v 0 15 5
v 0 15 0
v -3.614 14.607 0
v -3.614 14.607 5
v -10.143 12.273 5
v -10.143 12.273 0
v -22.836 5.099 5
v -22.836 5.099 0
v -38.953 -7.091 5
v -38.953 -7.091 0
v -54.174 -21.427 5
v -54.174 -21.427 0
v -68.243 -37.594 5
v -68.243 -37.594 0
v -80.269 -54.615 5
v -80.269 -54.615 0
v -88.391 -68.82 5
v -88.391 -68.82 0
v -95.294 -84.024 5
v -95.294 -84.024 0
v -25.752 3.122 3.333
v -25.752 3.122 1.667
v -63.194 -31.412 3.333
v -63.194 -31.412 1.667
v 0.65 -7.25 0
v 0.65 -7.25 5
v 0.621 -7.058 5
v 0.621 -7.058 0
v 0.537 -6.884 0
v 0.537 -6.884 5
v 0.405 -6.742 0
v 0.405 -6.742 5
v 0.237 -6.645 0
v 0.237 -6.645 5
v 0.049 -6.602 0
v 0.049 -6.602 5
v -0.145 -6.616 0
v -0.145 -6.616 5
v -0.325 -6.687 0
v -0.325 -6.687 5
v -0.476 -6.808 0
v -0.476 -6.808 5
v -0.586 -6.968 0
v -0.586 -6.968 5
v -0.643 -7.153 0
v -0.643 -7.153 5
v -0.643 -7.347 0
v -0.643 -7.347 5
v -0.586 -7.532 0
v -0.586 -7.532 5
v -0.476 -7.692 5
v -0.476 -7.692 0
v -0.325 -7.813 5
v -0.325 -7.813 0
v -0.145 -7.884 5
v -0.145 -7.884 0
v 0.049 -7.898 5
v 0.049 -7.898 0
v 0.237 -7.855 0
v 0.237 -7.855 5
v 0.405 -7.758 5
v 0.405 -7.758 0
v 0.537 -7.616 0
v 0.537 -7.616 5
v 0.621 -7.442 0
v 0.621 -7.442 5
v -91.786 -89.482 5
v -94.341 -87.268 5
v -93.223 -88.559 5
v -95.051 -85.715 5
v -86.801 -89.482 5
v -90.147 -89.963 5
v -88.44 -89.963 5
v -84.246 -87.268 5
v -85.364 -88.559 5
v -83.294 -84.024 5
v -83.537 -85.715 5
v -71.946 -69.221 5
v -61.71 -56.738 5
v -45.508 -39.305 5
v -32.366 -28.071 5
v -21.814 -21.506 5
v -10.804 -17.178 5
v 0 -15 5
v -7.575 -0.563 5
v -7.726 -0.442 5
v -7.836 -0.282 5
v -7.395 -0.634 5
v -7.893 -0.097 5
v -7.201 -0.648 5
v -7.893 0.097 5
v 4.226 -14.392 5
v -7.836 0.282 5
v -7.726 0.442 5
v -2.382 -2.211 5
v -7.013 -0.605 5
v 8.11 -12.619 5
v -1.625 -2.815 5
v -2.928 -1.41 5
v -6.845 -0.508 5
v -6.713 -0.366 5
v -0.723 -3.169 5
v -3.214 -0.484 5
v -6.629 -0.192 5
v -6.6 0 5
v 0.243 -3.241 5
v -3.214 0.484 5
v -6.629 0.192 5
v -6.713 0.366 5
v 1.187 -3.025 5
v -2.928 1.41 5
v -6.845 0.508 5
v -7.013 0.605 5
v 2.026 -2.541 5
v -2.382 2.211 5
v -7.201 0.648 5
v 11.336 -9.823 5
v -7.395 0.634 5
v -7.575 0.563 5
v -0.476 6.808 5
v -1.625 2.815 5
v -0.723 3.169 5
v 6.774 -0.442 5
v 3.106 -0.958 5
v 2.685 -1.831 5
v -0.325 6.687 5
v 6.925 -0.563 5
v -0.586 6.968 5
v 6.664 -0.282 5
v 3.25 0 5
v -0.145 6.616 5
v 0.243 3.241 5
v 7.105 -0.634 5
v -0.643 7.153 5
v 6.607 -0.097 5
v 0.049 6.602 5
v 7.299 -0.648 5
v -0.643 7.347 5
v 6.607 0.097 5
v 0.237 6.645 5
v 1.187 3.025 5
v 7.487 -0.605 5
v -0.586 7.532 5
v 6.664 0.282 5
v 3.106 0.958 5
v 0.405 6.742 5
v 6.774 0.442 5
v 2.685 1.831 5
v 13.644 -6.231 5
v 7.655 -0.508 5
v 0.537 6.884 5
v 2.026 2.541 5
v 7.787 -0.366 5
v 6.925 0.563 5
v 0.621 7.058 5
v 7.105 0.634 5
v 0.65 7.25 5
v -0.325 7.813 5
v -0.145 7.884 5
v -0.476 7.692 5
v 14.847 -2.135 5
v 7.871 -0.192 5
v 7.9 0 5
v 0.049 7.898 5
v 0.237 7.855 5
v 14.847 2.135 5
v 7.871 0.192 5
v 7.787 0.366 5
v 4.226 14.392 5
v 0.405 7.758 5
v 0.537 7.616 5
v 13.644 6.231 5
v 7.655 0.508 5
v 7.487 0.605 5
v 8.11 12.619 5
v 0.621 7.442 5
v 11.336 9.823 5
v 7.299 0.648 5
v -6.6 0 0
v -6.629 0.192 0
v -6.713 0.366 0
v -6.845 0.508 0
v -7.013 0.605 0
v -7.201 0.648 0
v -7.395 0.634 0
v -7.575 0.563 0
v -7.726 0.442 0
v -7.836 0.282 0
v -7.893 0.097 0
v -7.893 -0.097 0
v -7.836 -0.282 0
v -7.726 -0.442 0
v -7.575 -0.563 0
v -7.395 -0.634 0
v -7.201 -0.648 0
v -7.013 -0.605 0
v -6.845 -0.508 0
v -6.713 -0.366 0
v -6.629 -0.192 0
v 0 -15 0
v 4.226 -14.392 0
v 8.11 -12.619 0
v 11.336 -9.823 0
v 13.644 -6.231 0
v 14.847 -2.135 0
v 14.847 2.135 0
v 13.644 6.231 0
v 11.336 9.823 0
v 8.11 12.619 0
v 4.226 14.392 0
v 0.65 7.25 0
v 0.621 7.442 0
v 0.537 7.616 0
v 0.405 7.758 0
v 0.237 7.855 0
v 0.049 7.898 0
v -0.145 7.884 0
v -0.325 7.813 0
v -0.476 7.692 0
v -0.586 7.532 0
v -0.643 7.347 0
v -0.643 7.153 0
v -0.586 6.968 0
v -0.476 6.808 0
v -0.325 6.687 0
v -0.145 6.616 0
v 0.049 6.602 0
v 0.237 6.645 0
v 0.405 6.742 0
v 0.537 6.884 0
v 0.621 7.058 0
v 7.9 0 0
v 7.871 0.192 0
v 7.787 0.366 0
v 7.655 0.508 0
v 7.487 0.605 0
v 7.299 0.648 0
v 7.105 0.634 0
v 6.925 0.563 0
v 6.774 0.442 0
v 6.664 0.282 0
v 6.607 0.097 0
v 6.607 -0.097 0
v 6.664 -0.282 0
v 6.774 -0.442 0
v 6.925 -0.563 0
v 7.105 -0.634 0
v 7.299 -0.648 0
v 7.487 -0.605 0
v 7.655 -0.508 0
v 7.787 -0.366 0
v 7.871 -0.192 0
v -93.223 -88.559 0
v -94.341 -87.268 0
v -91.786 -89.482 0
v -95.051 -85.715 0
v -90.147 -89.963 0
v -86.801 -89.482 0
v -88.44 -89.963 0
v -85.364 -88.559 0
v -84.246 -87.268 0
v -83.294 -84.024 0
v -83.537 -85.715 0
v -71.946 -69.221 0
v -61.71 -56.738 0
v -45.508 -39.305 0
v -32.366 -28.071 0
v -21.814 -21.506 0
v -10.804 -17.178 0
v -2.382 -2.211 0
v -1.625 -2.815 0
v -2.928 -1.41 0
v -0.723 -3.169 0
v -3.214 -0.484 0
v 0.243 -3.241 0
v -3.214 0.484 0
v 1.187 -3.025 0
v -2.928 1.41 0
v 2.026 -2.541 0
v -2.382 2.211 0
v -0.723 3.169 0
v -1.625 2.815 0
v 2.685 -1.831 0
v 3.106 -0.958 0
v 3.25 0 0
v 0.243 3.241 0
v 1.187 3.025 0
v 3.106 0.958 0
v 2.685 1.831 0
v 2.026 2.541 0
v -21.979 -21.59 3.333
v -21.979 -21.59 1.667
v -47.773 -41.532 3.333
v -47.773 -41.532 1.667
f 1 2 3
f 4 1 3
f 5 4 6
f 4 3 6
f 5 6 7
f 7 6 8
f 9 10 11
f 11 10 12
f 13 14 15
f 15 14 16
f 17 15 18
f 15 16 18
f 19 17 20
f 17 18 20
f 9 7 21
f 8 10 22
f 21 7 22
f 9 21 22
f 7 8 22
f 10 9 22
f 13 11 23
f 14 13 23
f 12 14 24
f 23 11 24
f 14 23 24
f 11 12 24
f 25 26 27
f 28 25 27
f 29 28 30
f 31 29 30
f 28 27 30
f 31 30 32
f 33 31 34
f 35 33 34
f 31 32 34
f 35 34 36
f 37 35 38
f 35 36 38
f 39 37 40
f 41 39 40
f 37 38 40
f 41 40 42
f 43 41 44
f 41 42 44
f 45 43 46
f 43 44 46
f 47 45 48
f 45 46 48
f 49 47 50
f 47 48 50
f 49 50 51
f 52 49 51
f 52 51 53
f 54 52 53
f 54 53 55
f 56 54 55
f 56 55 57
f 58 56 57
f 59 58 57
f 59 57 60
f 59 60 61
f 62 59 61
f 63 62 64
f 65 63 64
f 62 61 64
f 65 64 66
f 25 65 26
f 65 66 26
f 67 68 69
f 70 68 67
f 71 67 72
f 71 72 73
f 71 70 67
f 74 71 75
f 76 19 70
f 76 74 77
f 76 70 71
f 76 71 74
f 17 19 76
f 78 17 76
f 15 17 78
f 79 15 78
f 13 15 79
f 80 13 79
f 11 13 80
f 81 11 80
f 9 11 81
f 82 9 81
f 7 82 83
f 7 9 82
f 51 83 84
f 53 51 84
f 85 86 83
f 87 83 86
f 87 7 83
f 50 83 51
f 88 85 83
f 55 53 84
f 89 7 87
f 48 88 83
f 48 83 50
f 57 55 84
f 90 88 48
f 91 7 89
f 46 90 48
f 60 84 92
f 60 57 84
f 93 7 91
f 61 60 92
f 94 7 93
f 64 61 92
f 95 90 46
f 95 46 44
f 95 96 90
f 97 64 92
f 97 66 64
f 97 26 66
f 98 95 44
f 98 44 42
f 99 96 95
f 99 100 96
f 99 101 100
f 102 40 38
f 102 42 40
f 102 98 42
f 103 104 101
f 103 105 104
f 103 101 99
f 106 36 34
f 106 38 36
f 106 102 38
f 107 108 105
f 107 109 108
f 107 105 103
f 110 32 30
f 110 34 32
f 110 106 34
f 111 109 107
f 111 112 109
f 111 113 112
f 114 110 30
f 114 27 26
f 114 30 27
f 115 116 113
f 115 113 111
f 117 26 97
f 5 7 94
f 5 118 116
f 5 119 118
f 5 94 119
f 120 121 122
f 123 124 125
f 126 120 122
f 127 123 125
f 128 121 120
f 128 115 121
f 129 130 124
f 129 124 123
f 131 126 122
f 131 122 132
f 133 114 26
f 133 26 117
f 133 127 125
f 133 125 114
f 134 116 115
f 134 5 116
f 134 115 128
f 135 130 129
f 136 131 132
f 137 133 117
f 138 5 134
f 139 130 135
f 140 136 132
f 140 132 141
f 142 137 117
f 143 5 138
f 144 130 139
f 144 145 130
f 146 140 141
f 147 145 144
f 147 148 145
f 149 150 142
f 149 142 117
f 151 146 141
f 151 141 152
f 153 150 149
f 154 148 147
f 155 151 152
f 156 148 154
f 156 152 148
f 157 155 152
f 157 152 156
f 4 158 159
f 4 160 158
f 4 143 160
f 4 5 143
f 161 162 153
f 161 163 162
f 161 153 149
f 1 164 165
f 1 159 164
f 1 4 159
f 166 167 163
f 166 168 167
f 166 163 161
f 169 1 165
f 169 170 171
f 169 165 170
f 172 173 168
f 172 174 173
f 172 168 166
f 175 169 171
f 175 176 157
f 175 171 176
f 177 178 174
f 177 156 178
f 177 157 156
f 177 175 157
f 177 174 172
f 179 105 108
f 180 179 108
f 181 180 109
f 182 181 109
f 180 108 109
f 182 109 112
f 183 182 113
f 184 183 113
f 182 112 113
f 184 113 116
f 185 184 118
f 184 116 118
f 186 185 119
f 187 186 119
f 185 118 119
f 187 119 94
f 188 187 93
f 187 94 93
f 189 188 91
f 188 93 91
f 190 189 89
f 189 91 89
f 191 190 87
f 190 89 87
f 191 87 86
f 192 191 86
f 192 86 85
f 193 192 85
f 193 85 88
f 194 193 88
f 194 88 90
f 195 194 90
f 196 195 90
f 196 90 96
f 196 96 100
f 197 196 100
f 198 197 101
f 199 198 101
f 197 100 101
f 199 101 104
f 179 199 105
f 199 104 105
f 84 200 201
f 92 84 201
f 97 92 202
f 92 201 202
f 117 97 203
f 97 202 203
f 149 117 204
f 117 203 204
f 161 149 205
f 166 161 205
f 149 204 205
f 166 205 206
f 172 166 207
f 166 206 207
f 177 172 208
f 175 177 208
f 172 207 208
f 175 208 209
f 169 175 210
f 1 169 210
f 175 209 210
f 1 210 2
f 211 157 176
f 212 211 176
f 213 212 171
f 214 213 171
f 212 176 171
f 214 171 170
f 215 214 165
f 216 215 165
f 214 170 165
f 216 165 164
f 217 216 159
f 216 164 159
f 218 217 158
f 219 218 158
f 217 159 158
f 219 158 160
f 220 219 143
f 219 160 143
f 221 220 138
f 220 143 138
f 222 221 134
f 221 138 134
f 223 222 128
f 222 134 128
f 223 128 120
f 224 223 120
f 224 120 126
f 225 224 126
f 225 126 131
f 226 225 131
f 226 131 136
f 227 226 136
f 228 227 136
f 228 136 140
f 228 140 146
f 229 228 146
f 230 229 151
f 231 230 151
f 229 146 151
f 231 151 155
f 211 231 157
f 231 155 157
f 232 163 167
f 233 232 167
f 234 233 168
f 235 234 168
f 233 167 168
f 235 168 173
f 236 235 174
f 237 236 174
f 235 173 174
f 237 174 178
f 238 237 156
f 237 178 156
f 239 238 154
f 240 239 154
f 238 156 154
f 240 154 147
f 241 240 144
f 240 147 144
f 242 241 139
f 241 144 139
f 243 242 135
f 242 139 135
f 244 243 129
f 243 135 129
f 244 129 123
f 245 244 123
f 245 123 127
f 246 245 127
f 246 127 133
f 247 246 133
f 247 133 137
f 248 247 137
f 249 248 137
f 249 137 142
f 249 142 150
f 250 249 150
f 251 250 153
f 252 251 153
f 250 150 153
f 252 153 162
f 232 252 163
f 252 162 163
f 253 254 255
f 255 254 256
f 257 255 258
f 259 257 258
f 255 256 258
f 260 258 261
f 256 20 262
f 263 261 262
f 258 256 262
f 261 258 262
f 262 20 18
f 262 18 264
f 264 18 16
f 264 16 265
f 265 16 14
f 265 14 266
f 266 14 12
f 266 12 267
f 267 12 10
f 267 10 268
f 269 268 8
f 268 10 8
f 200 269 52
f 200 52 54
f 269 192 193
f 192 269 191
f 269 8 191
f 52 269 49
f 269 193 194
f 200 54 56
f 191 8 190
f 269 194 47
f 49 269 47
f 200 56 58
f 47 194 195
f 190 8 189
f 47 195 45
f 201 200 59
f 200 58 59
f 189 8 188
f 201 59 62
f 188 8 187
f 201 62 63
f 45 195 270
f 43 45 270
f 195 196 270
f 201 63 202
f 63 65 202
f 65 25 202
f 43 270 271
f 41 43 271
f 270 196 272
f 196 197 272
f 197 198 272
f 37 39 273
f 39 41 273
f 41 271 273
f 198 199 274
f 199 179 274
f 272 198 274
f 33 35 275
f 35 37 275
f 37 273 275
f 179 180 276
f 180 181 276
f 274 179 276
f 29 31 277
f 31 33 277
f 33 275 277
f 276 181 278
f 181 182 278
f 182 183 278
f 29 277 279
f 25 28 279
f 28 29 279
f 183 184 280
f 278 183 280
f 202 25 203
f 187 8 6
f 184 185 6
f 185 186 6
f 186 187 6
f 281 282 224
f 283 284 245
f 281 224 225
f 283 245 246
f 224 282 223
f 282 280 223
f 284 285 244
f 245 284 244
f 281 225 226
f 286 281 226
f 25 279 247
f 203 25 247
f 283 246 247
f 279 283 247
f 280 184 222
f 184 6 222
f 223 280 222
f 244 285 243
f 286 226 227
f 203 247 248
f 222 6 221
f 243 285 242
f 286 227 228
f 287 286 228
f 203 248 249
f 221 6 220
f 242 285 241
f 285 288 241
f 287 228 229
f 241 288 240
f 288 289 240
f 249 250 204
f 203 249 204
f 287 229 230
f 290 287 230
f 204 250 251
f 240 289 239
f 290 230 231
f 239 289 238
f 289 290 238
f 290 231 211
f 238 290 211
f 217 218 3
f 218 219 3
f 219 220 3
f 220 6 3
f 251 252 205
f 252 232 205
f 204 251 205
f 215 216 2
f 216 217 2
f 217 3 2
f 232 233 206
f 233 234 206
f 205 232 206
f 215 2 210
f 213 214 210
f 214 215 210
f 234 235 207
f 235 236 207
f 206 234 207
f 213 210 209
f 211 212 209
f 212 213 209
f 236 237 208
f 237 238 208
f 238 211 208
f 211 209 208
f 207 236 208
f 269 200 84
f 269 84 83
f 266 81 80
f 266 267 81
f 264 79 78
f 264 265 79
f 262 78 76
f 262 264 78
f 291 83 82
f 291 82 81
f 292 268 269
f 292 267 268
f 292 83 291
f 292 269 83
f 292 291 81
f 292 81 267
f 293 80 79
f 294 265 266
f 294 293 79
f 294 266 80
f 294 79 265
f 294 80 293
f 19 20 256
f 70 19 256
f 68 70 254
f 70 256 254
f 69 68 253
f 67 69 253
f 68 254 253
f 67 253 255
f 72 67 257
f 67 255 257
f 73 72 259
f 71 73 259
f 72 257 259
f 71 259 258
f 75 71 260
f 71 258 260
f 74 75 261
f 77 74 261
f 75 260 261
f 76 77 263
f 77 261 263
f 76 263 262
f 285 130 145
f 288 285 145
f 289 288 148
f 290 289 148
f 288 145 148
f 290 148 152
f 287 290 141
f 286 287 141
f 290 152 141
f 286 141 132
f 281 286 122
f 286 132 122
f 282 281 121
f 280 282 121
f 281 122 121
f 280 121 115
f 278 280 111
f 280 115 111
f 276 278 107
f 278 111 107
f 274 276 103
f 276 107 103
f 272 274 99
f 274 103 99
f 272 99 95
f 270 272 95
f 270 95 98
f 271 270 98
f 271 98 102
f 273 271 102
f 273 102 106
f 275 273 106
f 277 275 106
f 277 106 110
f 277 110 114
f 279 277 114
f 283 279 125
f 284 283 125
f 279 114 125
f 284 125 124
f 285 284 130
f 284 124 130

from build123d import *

# Parameters (mm, degrees)
BOSS_EXTRUDE1_DEPTH = 5
SKETCH2_R           = 3.25
SKETCH2_R_2         = 0.65
CUT_EXTRUDE1_DEPTH  = 5


with BuildPart() as part:
    # Sketch1 → Boss-Extrude1 (new body)
    with BuildSketch(Plane.XY):
        with BuildLine():
            ThreePointArc((0, -15), (15, 0), (0, 15))
            add(Edge.make_bspline(
                [(0, 15), (-14.230583968, 15.97401443), (-71.542634771, -23.896673221), (-95.29355487, -84.024349777)],
                knots=[0, 0, 0, 0, 1, 1, 1, 1], degree=3))
            ThreePointArc((-95.29355487, -84.024349777), (-89.29355487, -90.024349777), (-83.293554869, -84.024349777))
            add(Edge.make_bspline(
                [(0, -15), (-22.042025083, -17.979465659), (-40.938355496, -27.190384656), (-83.293554869, -84.024349777)],
                knots=[0, 0, 0, 0, 1, 1, 1, 1], degree=3))
        make_face()
    extrude(amount=BOSS_EXTRUDE1_DEPTH)

    # Sketch2 → Cut-Extrude1 (cut)
    with BuildSketch(Plane.XY.offset(5)):
        Circle(SKETCH2_R)
        with Locations((0, 7.25)):
            Circle(SKETCH2_R_2)
        with Locations((-7.25, 0)):
            Circle(SKETCH2_R_2)
        with Locations((0, -7.25)):
            Circle(SKETCH2_R_2)
        with Locations((7.25, 0)):
            Circle(SKETCH2_R_2)
    extrude(amount=-CUT_EXTRUDE1_DEPTH, mode=Mode.SUBTRACT)


solid = part.part
